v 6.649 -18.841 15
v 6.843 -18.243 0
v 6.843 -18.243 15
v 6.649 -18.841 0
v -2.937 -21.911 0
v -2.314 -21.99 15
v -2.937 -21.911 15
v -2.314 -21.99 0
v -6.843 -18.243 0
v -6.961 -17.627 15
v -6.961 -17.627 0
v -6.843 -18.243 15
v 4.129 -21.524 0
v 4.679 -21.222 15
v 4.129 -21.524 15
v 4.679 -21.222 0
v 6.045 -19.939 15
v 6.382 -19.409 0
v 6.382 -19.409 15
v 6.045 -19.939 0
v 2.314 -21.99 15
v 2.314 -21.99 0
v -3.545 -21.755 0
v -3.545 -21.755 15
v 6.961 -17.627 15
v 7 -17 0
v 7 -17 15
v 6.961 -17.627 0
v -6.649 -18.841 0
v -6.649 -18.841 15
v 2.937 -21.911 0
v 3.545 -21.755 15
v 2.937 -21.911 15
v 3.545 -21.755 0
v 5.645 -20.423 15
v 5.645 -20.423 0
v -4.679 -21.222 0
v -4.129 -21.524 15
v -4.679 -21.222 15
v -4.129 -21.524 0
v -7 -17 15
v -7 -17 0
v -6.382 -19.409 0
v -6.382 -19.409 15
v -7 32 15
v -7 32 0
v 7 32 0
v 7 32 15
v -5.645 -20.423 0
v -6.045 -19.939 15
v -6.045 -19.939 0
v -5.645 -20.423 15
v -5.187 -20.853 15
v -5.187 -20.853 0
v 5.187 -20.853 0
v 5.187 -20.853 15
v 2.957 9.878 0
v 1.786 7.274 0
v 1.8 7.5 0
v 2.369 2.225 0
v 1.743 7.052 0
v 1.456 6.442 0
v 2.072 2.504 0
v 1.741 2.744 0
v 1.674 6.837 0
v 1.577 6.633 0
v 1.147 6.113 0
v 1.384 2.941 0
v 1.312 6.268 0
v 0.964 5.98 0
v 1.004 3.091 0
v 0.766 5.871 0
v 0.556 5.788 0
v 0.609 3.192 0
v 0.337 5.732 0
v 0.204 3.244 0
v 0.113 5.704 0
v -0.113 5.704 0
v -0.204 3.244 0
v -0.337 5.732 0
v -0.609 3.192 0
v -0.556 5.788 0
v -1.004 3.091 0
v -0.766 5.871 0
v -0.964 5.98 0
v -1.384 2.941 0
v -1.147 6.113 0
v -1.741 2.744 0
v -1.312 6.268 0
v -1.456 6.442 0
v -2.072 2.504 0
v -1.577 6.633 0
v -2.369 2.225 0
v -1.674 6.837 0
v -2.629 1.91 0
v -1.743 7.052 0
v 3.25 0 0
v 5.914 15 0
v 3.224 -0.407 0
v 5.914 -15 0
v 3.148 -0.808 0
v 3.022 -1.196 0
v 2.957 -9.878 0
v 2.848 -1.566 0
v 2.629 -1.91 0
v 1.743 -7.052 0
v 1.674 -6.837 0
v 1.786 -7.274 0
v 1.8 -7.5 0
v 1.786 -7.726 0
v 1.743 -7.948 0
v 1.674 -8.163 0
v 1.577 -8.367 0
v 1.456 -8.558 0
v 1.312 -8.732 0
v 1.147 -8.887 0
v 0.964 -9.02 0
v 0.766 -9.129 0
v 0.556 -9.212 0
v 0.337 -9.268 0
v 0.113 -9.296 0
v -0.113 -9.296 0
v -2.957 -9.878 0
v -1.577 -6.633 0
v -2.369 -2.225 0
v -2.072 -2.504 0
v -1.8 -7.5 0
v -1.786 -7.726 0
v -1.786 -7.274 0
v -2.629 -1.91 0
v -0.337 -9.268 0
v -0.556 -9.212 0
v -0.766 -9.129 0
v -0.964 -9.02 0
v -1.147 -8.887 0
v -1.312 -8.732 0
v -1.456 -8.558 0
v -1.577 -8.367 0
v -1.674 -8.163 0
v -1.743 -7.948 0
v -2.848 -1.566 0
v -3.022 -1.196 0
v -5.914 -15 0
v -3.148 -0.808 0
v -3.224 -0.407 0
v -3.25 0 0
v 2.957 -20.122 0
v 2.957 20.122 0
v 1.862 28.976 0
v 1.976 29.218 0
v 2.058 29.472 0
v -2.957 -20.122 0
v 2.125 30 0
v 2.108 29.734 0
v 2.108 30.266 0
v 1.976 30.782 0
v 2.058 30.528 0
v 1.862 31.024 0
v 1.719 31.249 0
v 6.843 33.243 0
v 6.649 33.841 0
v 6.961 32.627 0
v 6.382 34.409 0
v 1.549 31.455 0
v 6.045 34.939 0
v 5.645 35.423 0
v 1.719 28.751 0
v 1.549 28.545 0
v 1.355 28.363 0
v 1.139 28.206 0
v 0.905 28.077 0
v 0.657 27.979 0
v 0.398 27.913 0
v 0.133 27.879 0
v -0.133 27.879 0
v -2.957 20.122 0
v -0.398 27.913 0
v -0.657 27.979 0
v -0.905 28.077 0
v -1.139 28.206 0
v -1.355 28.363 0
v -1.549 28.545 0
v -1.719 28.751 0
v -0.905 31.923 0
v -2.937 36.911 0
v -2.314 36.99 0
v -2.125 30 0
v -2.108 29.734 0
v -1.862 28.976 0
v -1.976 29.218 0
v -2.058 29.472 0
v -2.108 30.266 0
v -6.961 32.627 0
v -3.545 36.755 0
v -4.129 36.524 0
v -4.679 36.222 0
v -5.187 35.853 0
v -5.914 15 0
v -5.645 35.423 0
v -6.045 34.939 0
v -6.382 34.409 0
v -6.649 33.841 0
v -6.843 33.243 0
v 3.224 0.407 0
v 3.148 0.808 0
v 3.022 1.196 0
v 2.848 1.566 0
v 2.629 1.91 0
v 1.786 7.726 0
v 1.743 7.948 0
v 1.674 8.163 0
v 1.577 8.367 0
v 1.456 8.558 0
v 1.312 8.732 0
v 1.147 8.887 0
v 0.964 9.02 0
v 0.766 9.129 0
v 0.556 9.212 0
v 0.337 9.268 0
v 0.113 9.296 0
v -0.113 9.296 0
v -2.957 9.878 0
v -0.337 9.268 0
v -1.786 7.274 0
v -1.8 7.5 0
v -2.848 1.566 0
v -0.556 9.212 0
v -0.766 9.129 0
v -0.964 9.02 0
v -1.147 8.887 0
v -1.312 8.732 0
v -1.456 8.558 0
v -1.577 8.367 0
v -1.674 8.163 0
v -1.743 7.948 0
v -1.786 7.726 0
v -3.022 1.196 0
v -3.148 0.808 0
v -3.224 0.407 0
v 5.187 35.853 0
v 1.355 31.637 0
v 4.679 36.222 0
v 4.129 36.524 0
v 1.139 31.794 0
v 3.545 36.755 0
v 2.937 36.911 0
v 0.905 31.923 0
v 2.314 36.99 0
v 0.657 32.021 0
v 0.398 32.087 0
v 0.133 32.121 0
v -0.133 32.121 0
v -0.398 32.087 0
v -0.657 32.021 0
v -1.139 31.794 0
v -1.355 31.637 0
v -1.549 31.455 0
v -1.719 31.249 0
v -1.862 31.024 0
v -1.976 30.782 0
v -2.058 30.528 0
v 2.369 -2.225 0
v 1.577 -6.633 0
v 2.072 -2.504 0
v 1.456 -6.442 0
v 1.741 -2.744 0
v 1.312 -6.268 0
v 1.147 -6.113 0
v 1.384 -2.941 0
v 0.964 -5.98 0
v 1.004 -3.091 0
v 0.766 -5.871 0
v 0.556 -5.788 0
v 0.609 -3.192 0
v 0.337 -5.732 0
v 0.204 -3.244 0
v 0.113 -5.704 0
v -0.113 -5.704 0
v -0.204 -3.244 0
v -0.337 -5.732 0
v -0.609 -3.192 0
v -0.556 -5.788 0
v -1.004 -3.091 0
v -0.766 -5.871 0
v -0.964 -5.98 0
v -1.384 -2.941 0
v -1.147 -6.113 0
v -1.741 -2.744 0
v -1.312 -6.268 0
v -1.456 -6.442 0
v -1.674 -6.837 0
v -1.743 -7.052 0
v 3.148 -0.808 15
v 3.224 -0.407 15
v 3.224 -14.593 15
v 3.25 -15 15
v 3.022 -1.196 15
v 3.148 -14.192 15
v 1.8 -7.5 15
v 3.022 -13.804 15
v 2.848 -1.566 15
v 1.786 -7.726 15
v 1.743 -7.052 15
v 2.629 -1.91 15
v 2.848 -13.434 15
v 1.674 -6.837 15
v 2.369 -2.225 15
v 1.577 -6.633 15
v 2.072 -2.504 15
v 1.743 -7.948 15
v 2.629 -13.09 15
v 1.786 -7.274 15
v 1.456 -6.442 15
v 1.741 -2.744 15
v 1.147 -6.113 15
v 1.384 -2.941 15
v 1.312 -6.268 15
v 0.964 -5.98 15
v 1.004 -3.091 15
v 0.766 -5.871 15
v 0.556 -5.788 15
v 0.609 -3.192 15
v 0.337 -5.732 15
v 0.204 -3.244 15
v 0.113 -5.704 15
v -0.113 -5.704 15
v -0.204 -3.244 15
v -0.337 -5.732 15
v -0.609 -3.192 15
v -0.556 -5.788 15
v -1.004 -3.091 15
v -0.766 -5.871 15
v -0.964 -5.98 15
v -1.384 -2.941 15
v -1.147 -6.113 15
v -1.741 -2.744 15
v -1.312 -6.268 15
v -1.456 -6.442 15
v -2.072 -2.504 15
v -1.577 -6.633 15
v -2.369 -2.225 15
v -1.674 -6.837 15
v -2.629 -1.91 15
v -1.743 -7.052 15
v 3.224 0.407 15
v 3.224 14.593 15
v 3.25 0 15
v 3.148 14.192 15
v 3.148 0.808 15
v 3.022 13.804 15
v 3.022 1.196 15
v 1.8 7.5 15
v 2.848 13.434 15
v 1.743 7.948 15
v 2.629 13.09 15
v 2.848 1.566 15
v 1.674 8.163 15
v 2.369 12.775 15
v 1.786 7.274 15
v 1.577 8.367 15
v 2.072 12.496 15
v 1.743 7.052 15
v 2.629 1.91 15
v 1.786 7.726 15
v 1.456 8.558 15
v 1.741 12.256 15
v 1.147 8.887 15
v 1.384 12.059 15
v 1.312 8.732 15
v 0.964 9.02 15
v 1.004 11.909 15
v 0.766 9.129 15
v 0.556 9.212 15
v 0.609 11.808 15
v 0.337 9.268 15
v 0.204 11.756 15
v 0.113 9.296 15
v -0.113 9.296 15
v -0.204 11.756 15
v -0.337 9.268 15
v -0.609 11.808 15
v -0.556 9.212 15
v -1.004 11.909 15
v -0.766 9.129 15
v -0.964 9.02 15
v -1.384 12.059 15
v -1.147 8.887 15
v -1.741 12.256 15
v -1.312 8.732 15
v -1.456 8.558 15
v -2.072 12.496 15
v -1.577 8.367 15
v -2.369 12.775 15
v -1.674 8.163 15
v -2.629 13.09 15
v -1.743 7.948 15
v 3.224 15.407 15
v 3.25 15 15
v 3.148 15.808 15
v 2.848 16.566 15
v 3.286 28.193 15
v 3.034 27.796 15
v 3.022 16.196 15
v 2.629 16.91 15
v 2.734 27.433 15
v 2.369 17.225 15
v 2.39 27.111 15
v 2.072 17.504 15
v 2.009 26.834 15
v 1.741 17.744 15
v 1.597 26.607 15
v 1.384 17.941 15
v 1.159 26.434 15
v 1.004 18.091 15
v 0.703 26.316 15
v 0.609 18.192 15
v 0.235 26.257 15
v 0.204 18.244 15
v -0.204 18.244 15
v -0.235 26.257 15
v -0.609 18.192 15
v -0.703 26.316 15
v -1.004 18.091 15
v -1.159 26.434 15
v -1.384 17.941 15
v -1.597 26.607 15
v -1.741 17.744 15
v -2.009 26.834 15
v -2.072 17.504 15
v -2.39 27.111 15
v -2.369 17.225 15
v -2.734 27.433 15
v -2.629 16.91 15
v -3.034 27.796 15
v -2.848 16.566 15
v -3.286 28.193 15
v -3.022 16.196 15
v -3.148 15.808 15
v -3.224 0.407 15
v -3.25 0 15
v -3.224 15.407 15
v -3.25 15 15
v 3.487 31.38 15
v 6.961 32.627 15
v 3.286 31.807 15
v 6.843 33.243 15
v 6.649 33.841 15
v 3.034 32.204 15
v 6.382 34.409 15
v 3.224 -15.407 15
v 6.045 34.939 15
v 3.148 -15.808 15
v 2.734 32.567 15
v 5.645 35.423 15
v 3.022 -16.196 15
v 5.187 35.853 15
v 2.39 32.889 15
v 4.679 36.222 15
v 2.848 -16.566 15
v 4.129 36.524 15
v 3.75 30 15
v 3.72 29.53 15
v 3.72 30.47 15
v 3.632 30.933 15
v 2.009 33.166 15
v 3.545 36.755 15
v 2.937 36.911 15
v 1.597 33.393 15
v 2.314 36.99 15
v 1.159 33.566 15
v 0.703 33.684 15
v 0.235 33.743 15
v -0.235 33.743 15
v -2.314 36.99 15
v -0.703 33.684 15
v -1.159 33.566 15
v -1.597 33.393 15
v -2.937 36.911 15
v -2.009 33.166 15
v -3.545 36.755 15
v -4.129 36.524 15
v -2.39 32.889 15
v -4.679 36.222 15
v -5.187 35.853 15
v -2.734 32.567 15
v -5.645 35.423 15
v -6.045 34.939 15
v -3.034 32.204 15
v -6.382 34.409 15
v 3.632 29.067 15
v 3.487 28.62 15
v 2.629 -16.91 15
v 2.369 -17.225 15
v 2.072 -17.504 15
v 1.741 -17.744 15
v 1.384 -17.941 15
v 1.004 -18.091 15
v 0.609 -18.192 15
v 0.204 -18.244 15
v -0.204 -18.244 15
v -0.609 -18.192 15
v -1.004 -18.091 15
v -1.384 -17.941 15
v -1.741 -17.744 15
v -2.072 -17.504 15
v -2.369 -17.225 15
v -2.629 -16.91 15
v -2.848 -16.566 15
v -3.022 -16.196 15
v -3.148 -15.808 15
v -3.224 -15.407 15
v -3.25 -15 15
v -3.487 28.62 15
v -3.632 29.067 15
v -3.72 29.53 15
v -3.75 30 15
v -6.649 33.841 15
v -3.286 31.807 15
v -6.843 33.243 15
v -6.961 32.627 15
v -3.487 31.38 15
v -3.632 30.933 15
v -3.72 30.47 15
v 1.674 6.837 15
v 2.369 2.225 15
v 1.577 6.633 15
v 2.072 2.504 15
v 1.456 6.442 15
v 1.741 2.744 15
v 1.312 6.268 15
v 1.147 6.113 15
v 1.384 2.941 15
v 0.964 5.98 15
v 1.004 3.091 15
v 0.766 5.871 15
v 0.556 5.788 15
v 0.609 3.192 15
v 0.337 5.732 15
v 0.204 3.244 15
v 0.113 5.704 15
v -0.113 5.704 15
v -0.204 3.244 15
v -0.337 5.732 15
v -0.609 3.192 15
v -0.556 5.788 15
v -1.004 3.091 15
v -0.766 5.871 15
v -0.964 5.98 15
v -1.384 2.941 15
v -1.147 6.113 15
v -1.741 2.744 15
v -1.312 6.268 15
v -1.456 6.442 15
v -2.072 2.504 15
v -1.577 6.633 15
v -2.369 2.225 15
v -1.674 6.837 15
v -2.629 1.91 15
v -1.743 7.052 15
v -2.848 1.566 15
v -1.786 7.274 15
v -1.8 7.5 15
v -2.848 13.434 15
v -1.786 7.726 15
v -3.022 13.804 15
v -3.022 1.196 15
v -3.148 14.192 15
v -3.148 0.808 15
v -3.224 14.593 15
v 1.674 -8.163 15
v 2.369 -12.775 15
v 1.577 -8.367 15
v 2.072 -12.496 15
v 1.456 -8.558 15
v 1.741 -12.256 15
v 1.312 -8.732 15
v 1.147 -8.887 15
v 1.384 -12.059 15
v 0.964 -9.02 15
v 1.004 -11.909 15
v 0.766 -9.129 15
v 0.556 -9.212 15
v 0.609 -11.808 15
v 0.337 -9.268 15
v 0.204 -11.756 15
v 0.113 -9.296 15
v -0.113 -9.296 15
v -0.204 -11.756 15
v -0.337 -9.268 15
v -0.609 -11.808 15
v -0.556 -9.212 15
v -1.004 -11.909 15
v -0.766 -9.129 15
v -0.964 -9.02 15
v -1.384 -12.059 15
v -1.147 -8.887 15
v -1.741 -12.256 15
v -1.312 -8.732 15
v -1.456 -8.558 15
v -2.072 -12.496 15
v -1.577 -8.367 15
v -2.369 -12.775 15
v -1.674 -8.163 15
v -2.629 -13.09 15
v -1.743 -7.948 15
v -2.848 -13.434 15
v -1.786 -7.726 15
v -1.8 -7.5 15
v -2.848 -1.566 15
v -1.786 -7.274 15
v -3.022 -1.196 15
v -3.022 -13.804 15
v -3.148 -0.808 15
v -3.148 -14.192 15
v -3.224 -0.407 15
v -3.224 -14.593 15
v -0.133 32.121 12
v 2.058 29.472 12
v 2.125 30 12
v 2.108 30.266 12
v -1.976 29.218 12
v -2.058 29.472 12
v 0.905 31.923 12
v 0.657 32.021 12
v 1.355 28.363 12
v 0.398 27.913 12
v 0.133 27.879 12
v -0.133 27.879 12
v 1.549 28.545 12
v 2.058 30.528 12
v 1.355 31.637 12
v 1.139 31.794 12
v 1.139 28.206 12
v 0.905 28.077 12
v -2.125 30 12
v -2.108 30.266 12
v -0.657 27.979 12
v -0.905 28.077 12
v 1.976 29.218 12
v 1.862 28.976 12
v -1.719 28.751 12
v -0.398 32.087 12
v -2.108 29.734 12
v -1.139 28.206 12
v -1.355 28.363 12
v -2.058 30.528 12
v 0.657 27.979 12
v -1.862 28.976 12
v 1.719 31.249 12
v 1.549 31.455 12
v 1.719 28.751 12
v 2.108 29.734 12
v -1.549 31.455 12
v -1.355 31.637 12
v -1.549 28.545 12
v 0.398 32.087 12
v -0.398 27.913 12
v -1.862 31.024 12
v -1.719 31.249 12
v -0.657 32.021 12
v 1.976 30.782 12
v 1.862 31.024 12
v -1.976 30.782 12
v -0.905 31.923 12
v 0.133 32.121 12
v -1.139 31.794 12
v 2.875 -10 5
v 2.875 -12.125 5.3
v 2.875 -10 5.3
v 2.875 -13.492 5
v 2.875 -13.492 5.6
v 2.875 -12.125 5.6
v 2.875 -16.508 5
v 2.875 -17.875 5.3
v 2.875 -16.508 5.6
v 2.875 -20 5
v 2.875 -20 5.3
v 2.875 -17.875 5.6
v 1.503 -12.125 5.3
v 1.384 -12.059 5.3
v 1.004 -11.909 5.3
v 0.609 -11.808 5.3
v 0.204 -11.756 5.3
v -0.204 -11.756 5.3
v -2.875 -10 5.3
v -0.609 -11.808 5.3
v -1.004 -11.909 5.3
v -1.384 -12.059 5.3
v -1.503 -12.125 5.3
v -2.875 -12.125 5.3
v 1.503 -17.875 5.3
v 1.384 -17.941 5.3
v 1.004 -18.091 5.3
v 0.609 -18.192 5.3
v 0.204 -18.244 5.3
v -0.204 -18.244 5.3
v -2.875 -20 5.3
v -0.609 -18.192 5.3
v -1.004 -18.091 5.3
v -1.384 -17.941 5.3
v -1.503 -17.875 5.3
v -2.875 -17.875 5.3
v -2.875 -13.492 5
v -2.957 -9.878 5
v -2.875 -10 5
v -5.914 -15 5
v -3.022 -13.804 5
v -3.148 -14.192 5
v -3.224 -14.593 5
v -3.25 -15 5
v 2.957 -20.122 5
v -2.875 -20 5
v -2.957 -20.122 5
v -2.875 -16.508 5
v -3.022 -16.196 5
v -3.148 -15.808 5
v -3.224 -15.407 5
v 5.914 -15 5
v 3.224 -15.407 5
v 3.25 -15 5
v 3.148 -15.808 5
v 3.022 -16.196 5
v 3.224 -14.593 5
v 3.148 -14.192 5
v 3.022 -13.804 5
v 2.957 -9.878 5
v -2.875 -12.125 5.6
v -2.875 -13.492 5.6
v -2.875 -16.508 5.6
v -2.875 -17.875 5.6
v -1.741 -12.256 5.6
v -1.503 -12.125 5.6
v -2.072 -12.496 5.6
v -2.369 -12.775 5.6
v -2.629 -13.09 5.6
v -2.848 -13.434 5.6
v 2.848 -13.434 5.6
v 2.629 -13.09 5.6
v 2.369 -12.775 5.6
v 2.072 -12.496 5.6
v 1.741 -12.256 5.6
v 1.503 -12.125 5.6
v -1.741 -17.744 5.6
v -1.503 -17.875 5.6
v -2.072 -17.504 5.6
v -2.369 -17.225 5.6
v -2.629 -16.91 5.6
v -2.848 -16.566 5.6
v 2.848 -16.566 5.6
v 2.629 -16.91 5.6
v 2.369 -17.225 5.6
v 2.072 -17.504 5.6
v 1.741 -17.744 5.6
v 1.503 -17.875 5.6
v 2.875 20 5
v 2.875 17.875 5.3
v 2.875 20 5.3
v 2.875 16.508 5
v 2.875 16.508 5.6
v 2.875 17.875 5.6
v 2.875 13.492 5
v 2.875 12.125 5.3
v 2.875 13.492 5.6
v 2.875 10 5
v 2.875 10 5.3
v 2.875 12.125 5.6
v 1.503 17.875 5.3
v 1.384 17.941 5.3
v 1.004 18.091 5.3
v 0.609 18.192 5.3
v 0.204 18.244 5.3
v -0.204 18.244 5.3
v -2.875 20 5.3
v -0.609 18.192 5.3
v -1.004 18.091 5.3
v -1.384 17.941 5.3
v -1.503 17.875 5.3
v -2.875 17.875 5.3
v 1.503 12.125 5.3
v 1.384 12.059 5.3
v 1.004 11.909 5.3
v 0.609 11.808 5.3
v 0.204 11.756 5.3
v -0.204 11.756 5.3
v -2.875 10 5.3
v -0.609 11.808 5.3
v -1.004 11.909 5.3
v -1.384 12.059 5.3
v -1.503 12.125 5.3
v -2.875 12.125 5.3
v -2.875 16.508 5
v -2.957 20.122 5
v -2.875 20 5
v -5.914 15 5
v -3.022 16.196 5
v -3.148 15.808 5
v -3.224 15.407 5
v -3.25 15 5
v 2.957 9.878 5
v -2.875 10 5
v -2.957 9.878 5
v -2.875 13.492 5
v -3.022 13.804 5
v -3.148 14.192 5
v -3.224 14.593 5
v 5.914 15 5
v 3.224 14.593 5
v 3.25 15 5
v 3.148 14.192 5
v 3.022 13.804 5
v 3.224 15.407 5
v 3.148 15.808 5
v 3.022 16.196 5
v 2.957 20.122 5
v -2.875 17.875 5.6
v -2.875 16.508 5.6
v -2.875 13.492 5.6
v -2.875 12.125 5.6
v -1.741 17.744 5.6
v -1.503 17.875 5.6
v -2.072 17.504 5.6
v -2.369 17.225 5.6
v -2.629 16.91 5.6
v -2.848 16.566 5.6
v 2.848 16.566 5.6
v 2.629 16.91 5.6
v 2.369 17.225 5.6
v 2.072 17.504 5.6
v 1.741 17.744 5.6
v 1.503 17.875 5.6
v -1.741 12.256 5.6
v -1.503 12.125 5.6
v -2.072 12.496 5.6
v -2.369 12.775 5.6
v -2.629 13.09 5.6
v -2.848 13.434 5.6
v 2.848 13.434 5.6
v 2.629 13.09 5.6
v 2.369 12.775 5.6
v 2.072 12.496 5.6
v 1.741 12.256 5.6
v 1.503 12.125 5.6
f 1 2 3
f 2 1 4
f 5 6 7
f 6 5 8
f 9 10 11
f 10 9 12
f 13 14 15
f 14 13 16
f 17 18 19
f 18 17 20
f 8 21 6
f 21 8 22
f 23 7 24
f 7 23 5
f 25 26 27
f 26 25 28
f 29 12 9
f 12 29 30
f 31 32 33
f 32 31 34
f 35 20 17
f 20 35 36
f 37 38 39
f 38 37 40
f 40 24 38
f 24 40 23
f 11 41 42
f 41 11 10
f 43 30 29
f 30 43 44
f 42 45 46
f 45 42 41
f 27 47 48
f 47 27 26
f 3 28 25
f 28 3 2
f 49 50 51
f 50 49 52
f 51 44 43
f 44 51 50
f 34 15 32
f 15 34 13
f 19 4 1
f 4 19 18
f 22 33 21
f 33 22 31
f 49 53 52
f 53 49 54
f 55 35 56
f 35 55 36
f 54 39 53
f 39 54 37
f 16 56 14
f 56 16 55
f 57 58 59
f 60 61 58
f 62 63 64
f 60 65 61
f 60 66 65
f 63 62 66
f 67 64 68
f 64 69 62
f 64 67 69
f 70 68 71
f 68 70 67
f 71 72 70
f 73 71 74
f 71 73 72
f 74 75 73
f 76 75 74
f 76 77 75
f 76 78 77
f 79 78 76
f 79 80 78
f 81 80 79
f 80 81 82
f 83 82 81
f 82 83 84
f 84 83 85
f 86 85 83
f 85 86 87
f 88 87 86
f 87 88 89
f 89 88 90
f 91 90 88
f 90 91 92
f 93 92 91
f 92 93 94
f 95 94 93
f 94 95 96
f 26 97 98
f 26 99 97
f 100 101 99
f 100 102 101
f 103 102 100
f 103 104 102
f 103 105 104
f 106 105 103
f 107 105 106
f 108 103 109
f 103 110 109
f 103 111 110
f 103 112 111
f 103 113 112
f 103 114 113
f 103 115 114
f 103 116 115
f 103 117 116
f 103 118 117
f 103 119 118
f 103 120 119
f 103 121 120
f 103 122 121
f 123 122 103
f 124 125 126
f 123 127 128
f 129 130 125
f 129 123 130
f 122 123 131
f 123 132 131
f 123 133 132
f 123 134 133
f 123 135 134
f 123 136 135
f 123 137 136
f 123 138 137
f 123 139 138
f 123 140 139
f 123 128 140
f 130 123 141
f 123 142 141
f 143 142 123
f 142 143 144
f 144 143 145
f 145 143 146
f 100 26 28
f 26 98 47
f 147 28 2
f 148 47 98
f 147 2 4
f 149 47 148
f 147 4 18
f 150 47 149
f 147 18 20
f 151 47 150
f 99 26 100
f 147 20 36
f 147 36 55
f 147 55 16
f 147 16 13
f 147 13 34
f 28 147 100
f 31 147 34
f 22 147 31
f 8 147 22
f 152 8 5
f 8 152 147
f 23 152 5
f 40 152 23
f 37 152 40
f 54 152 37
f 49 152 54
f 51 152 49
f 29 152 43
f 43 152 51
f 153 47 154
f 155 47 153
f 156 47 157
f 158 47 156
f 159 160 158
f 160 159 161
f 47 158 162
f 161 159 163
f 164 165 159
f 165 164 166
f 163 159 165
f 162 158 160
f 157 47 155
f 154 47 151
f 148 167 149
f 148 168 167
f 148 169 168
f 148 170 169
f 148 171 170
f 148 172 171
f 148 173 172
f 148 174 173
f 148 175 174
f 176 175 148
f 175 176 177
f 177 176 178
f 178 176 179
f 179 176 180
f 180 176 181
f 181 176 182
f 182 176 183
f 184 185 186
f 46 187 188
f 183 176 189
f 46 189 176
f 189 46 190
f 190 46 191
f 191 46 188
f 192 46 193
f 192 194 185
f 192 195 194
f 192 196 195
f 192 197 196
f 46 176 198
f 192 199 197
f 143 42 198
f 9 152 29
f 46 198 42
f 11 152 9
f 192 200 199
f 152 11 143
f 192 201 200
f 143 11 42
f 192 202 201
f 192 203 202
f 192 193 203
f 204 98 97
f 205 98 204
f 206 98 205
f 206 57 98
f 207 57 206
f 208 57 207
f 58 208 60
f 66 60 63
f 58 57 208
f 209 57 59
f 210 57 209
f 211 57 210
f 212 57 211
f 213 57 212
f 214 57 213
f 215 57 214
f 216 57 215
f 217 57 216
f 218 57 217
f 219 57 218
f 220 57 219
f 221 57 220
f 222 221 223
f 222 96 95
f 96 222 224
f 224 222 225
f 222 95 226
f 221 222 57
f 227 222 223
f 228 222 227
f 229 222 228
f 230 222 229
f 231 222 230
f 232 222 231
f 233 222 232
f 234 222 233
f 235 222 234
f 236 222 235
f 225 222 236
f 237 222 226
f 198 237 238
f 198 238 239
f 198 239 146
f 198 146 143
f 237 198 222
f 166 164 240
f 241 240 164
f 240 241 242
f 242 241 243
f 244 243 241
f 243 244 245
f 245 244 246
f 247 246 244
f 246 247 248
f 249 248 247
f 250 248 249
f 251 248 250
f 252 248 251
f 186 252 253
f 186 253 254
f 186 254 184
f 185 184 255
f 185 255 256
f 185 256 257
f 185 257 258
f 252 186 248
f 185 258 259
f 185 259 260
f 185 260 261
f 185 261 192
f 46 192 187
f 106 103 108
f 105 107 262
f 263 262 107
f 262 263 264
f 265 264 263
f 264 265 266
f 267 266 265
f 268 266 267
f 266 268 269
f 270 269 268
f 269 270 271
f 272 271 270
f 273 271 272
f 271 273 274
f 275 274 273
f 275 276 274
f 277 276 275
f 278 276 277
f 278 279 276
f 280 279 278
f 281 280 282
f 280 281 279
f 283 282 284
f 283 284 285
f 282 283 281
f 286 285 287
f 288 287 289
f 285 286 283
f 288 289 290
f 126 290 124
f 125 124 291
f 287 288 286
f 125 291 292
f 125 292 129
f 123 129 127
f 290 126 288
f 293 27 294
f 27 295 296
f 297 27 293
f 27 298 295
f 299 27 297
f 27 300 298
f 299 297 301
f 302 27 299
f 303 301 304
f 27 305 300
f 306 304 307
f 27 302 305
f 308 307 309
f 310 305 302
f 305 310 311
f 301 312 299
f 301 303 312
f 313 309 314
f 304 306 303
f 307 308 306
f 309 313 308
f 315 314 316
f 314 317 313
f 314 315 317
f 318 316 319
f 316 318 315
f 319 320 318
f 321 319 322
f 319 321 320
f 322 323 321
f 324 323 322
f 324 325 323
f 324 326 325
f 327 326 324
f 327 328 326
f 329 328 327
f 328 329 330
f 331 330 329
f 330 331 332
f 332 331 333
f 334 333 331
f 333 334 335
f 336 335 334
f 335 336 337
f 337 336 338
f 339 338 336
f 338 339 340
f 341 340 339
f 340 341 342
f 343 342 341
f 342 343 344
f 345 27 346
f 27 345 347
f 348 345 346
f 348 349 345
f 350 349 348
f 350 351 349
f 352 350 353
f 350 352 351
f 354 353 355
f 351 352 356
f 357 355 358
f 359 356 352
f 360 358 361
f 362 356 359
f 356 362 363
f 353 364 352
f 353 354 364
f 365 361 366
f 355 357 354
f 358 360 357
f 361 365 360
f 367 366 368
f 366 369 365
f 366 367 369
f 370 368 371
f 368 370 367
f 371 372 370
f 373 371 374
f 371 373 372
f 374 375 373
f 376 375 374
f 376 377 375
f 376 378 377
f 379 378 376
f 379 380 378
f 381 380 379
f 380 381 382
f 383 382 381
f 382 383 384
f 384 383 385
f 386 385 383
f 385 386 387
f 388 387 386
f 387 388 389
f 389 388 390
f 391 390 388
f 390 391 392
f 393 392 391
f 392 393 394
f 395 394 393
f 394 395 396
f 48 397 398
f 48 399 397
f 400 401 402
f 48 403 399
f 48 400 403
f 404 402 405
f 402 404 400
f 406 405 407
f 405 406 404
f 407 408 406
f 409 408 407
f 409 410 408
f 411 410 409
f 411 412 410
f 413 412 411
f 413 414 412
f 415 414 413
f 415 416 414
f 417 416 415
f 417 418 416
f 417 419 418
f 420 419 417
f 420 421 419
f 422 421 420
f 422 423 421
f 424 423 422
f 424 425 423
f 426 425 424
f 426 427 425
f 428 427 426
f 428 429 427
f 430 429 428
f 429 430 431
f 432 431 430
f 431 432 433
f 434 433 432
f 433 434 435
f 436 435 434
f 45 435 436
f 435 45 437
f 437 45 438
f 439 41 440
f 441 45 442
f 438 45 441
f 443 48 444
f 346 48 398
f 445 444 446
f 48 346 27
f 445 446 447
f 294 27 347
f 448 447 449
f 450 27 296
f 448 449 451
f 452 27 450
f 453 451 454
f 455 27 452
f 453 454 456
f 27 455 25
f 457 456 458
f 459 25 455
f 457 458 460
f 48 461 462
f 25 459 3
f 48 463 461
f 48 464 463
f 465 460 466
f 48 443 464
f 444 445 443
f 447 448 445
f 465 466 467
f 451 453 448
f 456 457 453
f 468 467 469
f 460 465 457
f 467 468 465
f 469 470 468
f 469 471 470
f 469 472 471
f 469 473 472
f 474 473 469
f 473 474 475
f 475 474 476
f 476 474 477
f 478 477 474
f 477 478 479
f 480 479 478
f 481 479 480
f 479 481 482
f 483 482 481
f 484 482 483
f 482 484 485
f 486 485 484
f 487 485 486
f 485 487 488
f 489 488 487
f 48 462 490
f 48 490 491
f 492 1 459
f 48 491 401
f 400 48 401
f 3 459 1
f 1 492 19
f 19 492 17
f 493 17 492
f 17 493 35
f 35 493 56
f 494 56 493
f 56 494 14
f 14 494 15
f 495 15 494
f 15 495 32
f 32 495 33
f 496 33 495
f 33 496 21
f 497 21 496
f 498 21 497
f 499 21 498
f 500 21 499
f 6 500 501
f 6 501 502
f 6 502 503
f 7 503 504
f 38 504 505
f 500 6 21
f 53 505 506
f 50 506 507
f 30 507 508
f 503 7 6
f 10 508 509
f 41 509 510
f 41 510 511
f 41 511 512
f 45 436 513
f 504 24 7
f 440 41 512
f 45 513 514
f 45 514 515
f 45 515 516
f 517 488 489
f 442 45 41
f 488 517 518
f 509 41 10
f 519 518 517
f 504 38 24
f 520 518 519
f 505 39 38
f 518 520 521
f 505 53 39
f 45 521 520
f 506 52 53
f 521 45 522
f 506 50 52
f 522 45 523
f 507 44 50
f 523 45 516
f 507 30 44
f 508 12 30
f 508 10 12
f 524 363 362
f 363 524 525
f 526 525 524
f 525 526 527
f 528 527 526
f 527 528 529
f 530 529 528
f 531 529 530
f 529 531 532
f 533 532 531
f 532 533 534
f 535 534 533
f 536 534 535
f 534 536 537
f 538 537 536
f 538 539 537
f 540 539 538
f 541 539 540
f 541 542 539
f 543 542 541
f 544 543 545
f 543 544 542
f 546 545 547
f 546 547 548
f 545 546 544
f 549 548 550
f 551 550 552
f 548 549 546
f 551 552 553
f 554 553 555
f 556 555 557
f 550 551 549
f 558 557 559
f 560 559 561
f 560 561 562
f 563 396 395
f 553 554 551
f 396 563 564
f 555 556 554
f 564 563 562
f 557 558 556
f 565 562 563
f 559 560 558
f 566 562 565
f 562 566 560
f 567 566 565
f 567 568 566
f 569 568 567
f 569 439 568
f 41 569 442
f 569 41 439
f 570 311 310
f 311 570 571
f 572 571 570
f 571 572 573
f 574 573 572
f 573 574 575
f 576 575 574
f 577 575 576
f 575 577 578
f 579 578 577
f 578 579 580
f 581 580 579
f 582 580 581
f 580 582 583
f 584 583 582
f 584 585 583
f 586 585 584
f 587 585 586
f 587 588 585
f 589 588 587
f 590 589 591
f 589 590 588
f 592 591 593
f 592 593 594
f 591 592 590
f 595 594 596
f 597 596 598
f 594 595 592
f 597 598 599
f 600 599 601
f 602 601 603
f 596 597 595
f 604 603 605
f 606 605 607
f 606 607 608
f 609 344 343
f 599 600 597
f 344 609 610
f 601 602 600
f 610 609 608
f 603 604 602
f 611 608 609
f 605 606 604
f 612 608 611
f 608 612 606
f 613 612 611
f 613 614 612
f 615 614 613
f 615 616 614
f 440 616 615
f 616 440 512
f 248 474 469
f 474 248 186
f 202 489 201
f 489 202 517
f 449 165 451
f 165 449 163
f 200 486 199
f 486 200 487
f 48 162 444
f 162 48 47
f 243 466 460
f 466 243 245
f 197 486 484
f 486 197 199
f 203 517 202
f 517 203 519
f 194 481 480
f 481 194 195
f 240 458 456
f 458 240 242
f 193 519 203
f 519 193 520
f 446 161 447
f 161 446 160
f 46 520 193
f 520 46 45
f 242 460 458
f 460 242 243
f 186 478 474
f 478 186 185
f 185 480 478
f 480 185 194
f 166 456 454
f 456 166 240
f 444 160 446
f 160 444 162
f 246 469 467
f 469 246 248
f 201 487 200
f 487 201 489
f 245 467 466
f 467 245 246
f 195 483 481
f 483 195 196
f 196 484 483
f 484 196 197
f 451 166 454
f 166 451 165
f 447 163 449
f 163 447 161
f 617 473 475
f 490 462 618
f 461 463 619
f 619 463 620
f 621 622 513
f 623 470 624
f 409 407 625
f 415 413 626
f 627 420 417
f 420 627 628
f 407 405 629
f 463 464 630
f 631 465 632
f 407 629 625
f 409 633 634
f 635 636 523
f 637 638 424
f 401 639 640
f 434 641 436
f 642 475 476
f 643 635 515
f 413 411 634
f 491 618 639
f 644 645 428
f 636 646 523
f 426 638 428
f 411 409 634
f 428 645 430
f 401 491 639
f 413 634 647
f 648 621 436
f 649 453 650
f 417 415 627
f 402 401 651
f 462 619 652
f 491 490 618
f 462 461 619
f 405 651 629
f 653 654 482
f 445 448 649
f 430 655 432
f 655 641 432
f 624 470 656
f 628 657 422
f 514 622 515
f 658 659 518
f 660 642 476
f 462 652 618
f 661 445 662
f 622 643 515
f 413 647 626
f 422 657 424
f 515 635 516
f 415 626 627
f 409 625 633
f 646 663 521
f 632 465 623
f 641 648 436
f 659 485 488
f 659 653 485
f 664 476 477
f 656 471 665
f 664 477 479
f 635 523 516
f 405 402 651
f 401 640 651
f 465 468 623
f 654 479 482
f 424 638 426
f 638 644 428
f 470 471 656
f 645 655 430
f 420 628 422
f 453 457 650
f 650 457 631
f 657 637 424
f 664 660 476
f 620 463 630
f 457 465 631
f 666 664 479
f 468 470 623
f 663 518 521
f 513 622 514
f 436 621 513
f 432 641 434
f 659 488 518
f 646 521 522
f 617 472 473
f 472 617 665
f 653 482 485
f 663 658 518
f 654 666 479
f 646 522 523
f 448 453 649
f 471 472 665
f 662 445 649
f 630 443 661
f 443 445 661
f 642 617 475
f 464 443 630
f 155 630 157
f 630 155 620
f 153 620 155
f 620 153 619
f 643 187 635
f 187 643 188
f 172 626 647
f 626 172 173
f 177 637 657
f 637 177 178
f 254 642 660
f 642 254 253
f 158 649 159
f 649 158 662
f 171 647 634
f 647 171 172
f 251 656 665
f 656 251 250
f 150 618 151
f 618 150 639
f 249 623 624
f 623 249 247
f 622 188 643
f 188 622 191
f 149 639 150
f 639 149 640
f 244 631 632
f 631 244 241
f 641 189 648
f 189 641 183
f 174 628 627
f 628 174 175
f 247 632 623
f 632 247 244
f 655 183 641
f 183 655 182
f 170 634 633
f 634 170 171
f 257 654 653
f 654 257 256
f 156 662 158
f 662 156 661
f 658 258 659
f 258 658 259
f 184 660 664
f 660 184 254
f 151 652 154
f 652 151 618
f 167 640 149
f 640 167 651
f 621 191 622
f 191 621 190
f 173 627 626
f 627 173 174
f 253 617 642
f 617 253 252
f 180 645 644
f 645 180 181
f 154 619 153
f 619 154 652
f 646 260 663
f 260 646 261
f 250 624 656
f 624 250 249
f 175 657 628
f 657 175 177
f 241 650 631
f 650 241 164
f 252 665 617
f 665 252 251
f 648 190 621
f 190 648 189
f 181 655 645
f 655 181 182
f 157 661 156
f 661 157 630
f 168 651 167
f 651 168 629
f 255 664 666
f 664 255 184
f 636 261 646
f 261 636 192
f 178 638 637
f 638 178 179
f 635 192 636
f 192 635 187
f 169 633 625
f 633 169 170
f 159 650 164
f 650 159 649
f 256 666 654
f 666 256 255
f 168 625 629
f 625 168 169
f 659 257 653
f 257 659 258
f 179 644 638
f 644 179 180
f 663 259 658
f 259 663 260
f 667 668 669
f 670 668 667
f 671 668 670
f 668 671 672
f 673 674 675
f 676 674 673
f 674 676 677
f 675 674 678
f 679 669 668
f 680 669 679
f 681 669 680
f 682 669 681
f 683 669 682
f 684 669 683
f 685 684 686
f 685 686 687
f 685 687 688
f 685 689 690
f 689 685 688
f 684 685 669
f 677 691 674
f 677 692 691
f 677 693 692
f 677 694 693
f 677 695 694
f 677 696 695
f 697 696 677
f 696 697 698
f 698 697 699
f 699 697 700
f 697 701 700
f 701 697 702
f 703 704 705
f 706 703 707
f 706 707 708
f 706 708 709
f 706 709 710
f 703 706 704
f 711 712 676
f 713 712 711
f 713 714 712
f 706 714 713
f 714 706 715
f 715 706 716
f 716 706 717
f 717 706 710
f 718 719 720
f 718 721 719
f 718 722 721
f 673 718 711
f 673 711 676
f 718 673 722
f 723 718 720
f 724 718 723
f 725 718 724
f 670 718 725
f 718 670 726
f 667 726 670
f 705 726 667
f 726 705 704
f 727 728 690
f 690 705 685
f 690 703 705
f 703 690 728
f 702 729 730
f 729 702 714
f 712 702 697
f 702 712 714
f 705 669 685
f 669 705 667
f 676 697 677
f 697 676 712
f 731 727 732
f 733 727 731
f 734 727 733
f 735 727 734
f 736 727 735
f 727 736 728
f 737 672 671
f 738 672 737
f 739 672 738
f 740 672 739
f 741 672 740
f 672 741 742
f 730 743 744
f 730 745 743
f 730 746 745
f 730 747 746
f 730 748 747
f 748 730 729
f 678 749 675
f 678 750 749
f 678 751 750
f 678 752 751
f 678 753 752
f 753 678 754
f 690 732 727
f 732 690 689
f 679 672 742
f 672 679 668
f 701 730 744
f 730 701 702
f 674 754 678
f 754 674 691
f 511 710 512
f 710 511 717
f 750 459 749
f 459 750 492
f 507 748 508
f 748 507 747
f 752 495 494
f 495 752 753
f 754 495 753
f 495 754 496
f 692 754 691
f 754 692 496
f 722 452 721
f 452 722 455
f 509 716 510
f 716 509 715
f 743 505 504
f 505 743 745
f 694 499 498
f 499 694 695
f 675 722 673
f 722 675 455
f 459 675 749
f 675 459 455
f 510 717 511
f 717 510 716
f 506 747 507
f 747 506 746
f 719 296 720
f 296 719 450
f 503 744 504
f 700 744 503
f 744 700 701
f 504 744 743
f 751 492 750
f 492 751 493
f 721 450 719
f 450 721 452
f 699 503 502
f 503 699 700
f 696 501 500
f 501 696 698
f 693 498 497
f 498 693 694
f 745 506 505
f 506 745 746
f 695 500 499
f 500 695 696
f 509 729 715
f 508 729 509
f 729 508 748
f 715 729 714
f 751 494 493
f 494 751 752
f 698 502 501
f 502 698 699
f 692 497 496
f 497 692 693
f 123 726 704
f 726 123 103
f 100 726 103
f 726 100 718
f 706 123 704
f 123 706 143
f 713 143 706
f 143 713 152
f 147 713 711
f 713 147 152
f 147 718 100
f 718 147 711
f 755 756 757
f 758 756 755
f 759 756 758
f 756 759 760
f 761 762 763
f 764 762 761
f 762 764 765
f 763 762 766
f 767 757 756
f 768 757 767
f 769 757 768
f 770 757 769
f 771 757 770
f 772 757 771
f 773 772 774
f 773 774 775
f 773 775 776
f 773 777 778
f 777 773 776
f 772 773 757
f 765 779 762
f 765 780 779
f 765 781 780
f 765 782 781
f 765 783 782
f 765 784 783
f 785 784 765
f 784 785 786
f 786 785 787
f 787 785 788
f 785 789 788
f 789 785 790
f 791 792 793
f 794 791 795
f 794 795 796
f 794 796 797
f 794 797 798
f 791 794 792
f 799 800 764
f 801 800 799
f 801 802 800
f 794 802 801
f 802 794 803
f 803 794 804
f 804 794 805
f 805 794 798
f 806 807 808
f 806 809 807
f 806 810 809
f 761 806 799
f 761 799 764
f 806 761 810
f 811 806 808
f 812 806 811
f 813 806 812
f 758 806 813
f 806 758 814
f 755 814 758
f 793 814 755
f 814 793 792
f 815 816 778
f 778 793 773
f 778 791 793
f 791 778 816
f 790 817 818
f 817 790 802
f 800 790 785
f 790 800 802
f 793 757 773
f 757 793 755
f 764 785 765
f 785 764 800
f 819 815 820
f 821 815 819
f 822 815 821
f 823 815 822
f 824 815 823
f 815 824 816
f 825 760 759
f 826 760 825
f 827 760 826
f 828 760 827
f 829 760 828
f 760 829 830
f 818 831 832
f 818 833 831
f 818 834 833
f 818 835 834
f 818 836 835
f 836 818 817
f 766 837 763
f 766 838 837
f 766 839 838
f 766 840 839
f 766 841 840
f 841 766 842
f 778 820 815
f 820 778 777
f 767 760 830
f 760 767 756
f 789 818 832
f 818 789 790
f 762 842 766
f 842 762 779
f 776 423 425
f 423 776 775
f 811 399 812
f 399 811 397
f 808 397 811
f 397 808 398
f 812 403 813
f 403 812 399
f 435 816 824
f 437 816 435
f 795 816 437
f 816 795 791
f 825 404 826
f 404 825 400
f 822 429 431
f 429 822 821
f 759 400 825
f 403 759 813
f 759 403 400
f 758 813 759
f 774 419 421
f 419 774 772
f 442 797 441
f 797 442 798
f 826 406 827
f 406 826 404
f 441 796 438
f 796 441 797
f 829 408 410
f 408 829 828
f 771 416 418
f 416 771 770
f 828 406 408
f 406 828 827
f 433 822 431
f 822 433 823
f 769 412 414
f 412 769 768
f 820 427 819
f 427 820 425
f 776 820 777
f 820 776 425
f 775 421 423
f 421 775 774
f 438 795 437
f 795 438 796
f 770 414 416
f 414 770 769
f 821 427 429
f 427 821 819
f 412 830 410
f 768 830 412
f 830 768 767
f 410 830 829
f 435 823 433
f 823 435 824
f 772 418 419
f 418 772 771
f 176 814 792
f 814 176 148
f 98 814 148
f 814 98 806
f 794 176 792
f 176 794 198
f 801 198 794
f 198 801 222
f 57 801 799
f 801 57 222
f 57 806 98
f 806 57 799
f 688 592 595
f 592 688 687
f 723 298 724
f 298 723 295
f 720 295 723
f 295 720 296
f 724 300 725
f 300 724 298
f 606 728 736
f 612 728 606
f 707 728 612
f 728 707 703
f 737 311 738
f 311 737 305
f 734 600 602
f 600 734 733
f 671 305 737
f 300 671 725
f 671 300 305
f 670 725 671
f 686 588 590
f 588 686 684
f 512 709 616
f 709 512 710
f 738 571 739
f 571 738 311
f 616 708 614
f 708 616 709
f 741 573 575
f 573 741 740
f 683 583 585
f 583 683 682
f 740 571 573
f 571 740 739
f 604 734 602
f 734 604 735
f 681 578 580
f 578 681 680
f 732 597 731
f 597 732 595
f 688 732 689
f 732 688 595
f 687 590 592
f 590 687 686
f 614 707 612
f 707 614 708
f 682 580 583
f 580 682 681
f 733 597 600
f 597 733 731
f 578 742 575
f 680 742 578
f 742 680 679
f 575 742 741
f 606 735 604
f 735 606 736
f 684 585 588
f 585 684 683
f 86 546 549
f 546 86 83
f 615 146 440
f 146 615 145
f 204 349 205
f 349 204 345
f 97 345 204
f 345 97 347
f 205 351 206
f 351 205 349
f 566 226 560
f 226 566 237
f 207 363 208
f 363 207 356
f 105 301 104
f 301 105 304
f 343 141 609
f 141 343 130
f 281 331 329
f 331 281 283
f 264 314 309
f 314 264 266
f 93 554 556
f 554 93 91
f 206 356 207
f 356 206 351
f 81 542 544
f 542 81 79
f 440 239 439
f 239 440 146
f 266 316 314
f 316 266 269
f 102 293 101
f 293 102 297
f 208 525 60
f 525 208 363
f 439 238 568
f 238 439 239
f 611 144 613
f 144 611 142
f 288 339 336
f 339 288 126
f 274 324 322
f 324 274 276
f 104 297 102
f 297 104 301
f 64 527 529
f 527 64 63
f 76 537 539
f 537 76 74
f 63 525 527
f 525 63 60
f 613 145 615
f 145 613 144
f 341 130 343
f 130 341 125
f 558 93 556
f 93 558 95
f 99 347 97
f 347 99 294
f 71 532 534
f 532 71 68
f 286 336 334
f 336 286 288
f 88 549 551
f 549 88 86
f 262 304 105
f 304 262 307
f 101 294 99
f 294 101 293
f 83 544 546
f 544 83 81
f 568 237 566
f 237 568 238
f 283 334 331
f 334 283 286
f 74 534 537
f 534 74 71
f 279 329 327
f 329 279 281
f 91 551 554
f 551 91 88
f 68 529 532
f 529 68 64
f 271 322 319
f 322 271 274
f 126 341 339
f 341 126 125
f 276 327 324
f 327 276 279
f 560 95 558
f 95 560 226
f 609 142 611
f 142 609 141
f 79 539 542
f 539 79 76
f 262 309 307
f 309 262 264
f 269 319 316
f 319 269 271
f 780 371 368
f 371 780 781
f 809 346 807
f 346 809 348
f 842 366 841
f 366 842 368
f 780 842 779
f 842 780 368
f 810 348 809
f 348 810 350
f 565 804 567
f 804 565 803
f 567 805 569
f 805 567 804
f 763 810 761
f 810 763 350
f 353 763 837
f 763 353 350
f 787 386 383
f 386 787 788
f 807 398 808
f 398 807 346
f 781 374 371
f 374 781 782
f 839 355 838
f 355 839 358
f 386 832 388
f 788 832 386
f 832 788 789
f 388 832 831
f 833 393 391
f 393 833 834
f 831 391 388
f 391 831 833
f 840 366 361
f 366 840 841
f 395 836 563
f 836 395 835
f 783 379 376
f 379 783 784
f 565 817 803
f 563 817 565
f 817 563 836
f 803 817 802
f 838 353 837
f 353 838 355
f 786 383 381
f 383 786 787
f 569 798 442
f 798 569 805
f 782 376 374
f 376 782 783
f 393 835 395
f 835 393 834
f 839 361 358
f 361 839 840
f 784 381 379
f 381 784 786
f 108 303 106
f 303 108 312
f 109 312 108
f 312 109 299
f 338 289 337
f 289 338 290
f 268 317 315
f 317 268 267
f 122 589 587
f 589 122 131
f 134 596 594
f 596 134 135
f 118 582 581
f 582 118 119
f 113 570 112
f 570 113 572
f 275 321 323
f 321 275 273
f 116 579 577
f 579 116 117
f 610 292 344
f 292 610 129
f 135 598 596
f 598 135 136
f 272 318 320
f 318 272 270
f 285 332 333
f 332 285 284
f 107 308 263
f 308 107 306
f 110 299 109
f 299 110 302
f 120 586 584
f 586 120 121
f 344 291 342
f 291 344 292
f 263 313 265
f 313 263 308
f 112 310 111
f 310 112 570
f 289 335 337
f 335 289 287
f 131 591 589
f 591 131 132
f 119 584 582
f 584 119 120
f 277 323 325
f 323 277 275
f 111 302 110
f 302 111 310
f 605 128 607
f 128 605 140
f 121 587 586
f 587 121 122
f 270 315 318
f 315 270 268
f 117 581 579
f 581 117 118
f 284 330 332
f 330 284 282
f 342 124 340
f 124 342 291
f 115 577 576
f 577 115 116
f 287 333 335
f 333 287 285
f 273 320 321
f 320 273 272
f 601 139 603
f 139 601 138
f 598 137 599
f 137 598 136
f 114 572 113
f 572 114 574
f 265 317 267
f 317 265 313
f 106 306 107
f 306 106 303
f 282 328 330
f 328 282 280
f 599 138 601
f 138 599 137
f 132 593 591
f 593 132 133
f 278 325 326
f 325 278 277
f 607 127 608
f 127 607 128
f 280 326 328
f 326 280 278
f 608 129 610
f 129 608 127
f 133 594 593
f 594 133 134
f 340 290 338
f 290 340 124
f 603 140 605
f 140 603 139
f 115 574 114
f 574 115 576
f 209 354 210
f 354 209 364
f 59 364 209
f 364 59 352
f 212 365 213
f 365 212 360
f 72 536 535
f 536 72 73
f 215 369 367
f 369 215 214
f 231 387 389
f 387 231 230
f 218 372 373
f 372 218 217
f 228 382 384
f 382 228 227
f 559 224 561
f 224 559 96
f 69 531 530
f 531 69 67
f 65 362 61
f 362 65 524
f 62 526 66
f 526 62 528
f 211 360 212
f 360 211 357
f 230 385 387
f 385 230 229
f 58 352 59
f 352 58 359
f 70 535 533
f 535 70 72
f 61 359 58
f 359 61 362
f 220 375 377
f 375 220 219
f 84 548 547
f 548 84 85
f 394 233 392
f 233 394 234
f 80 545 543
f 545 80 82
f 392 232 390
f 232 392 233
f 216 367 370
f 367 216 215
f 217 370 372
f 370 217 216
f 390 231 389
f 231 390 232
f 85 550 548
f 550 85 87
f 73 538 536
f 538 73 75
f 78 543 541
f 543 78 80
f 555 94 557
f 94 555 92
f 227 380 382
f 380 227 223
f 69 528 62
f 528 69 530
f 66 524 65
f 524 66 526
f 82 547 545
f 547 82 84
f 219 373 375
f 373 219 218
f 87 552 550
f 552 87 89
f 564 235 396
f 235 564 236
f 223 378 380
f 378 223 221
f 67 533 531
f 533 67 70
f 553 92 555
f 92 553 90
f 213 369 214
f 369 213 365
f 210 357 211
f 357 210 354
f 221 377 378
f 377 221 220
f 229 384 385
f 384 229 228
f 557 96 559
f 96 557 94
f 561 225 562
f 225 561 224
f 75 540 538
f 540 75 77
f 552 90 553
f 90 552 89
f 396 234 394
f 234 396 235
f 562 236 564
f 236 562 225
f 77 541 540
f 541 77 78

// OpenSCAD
$fn = 50;


difference() {
	union() {
		hull() {
			translate(v = [-2.0000000000, 17.0000000000, 0]) {
				cylinder(h = 15, r = 5);
			}
			translate(v = [2.0000000000, 17.0000000000, 0]) {
				cylinder(h = 15, r = 5);
			}
			translate(v = [-2.0000000000, -17.0000000000, 0]) {
				cylinder(h = 15, r = 5);
			}
			translate(v = [2.0000000000, -17.0000000000, 0]) {
				cylinder(h = 15, r = 5);
			}
		}
		translate(v = [0.0000000000, 22.5000000000, 0]) {
			hull() {
				translate(v = [-2.0000000000, 9.5000000000, 0]) {
					cylinder(h = 15, r = 5);
				}
				translate(v = [2.0000000000, 9.5000000000, 0]) {
					cylinder(h = 15, r = 5);
				}
				translate(v = [-2.0000000000, -9.5000000000, 0]) {
					cylinder(h = 15, r = 5);
				}
				translate(v = [2.0000000000, -9.5000000000, 0]) {
					cylinder(h = 15, r = 5);
				}
			}
		}
		translate(v = [0.0000000000, 22.5000000000, 0]) {
			hull() {
				translate(v = [-2.0000000000, 9.5000000000, 0]) {
					cylinder(h = 15, r = 5);
				}
				translate(v = [2.0000000000, 9.5000000000, 0]) {
					cylinder(h = 15, r = 5);
				}
				translate(v = [-2.0000000000, -9.5000000000, 0]) {
					cylinder(h = 15, r = 5);
				}
				translate(v = [2.0000000000, -9.5000000000, 0]) {
					cylinder(h = 15, r = 5);
				}
			}
		}
	}
	union() {
		translate(v = [0.0000000000, 30.0000000000, 15]) {
			rotate(a = [0, 0, 0]) {
				difference() {
					union() {
						#translate(v = [0, 0, -15.0000000000]) {
							cylinder(h = 15, r = 2.0000000000);
						}
						#translate(v = [0, 0, -3]) {
							cylinder(h = 3, r1 = 2.1250000000, r2 = 3.7500000000);
						}
						#translate(v = [0, 0, -15.0000000000]) {
							cylinder(h = 15, r = 2.1250000000);
						}
						#translate(v = [0, 0, -15.0000000000]) {
							cylinder(h = 15, r = 2.0000000000);
						}
					}
					union();
				}
			}
		}
		translate(v = [0.0000000000, 30.0000000000, 15]) {
			rotate(a = [0, 0, 0]) {
				difference() {
					union() {
						#translate(v = [0, 0, -15.0000000000]) {
							cylinder(h = 15, r = 2.0000000000);
						}
						#translate(v = [0, 0, -3]) {
							cylinder(h = 3, r1 = 2.1250000000, r2 = 3.7500000000);
						}
						#translate(v = [0, 0, -15.0000000000]) {
							cylinder(h = 15, r = 2.1250000000);
						}
						#translate(v = [0, 0, -15.0000000000]) {
							cylinder(h = 15, r = 2.0000000000);
						}
					}
					union();
				}
			}
		}
		translate(v = [0.0000000000, -15.0000000000, 0]) {
			rotate(a = [0, 0, 0]) {
				difference() {
					union() {
						#translate(v = [-2.8750000000, -5.0000000000, -0.3000000000]) {
							cube(size = [5.7500000000, 10, 0.3000000000]);
						}
						#translate(v = [-2.8750000000, -2.8750000000, -0.6000000000]) {
							cube(size = [5.7500000000, 5.7500000000, 0.3000000000]);
						}
						#translate(v = [-2.8750000000, -5.0000000000, 5]) {
							cube(size = [5.7500000000, 10, 0.3000000000]);
						}
						#translate(v = [-2.8750000000, -2.8750000000, 5.3000000000]) {
							cube(size = [5.7500000000, 5.7500000000, 0.3000000000]);
						}
						#translate(v = [0, 0, -100.0000000000]) {
							cylinder(h = 200, r = 3.2500000000);
						}
						#linear_extrude(height = 5) {
							polygon(points = [[5.9142500000, 0.0000000000], [2.9571250000, 5.1218907443], [-2.9571250000, 5.1218907443], [-5.9142500000, 0.0000000000], [-2.9571250000, -5.1218907443], [2.9571250000, -5.1218907443]]);
						}
						#translate(v = [-2.8750000000, -5.0000000000, -0.3000000000]) {
							cube(size = [5.7500000000, 10, 0.3000000000]);
						}
						#translate(v = [-2.8750000000, -2.8750000000, -0.6000000000]) {
							cube(size = [5.7500000000, 5.7500000000, 0.3000000000]);
						}
						#translate(v = [-2.8750000000, -5.0000000000, 5]) {
							cube(size = [5.7500000000, 10, 0.3000000000]);
						}
						#translate(v = [-2.8750000000, -2.8750000000, 5.3000000000]) {
							cube(size = [5.7500000000, 5.7500000000, 0.3000000000]);
						}
						#translate(v = [0, 0, -100.0000000000]) {
							cylinder(h = 200, r = 3.2500000000);
						}
						#translate(v = [-2.8750000000, -5.0000000000, -0.3000000000]) {
							cube(size = [5.7500000000, 10, 0.3000000000]);
						}
						#translate(v = [-2.8750000000, -2.8750000000, -0.6000000000]) {
							cube(size = [5.7500000000, 5.7500000000, 0.3000000000]);
						}
						#translate(v = [-2.8750000000, -5.0000000000, 5]) {
							cube(size = [5.7500000000, 10, 0.3000000000]);
						}
						#translate(v = [-2.8750000000, -2.8750000000, 5.3000000000]) {
							cube(size = [5.7500000000, 5.7500000000, 0.3000000000]);
						}
						#translate(v = [0, 0, -100.0000000000]) {
							cylinder(h = 200, r = 3.2500000000);
						}
					}
					union();
				}
			}
		}
		translate(v = [0.0000000000, 15.0000000000, 0]) {
			rotate(a = [0, 0, 0]) {
				difference() {
					union() {
						#translate(v = [-2.8750000000, -5.0000000000, -0.3000000000]) {
							cube(size = [5.7500000000, 10, 0.3000000000]);
						}
						#translate(v = [-2.8750000000, -2.8750000000, -0.6000000000]) {
							cube(size = [5.7500000000, 5.7500000000, 0.3000000000]);
						}
						#translate(v = [-2.8750000000, -5.0000000000, 5]) {
							cube(size = [5.7500000000, 10, 0.3000000000]);
						}
						#translate(v = [-2.8750000000, -2.8750000000, 5.3000000000]) {
							cube(size = [5.7500000000, 5.7500000000, 0.3000000000]);
						}
						#translate(v = [0, 0, -100.0000000000]) {
							cylinder(h = 200, r = 3.2500000000);
						}
						#linear_extrude(height = 5) {
							polygon(points = [[5.9142500000, 0.0000000000], [2.9571250000, 5.1218907443], [-2.9571250000, 5.1218907443], [-5.9142500000, 0.0000000000], [-2.9571250000, -5.1218907443], [2.9571250000, -5.1218907443]]);
						}
						#translate(v = [-2.8750000000, -5.0000000000, -0.3000000000]) {
							cube(size = [5.7500000000, 10, 0.3000000000]);
						}
						#translate(v = [-2.8750000000, -2.8750000000, -0.6000000000]) {
							cube(size = [5.7500000000, 5.7500000000, 0.3000000000]);
						}
						#translate(v = [-2.8750000000, -5.0000000000, 5]) {
							cube(size = [5.7500000000, 10, 0.3000000000]);
						}
						#translate(v = [-2.8750000000, -2.8750000000, 5.3000000000]) {
							cube(size = [5.7500000000, 5.7500000000, 0.3000000000]);
						}
						#translate(v = [0, 0, -100.0000000000]) {
							cylinder(h = 200, r = 3.2500000000);
						}
						#translate(v = [-2.8750000000, -5.0000000000, -0.3000000000]) {
							cube(size = [5.7500000000, 10, 0.3000000000]);
						}
						#translate(v = [-2.8750000000, -2.8750000000, -0.6000000000]) {
							cube(size = [5.7500000000, 5.7500000000, 0.3000000000]);
						}
						#translate(v = [-2.8750000000, -5.0000000000, 5]) {
							cube(size = [5.7500000000, 10, 0.3000000000]);
						}
						#translate(v = [-2.8750000000, -2.8750000000, 5.3000000000]) {
							cube(size = [5.7500000000, 5.7500000000, 0.3000000000]);
						}
						#translate(v = [0, 0, -100.0000000000]) {
							cylinder(h = 200, r = 3.2500000000);
						}
					}
					union();
				}
			}
		}
		translate(v = [0.0000000000, -15.0000000000, 0]) {
			translate(v = [0, 0, -100]) {
				cylinder(h = 200, r = 3.2500000000);
			}
		}
		translate(v = [0, 0, -100]) {
			cylinder(h = 200, r = 3.2500000000);
		}
		translate(v = [0.0000000000, 15.0000000000, 0]) {
			translate(v = [0, 0, -100]) {
				cylinder(h = 200, r = 3.2500000000);
			}
		}
		translate(v = [0.0000000000, -15.0000000000, 0]) {
			translate(v = [0, 0, -100]) {
				cylinder(h = 200, r = 1.8000000000);
			}
		}
		translate(v = [0.0000000000, -7.5000000000, 0]) {
			translate(v = [0, 0, -100]) {
				cylinder(h = 200, r = 1.8000000000);
			}
		}
		translate(v = [0, 0, -100]) {
			cylinder(h = 200, r = 1.8000000000);
		}
		translate(v = [0.0000000000, 7.5000000000, 0]) {
			translate(v = [0, 0, -100]) {
				cylinder(h = 200, r = 1.8000000000);
			}
		}
		translate(v = [0.0000000000, 15.0000000000, 0]) {
			translate(v = [0, 0, -100]) {
				cylinder(h = 200, r = 1.8000000000);
			}
		}
	}
}
